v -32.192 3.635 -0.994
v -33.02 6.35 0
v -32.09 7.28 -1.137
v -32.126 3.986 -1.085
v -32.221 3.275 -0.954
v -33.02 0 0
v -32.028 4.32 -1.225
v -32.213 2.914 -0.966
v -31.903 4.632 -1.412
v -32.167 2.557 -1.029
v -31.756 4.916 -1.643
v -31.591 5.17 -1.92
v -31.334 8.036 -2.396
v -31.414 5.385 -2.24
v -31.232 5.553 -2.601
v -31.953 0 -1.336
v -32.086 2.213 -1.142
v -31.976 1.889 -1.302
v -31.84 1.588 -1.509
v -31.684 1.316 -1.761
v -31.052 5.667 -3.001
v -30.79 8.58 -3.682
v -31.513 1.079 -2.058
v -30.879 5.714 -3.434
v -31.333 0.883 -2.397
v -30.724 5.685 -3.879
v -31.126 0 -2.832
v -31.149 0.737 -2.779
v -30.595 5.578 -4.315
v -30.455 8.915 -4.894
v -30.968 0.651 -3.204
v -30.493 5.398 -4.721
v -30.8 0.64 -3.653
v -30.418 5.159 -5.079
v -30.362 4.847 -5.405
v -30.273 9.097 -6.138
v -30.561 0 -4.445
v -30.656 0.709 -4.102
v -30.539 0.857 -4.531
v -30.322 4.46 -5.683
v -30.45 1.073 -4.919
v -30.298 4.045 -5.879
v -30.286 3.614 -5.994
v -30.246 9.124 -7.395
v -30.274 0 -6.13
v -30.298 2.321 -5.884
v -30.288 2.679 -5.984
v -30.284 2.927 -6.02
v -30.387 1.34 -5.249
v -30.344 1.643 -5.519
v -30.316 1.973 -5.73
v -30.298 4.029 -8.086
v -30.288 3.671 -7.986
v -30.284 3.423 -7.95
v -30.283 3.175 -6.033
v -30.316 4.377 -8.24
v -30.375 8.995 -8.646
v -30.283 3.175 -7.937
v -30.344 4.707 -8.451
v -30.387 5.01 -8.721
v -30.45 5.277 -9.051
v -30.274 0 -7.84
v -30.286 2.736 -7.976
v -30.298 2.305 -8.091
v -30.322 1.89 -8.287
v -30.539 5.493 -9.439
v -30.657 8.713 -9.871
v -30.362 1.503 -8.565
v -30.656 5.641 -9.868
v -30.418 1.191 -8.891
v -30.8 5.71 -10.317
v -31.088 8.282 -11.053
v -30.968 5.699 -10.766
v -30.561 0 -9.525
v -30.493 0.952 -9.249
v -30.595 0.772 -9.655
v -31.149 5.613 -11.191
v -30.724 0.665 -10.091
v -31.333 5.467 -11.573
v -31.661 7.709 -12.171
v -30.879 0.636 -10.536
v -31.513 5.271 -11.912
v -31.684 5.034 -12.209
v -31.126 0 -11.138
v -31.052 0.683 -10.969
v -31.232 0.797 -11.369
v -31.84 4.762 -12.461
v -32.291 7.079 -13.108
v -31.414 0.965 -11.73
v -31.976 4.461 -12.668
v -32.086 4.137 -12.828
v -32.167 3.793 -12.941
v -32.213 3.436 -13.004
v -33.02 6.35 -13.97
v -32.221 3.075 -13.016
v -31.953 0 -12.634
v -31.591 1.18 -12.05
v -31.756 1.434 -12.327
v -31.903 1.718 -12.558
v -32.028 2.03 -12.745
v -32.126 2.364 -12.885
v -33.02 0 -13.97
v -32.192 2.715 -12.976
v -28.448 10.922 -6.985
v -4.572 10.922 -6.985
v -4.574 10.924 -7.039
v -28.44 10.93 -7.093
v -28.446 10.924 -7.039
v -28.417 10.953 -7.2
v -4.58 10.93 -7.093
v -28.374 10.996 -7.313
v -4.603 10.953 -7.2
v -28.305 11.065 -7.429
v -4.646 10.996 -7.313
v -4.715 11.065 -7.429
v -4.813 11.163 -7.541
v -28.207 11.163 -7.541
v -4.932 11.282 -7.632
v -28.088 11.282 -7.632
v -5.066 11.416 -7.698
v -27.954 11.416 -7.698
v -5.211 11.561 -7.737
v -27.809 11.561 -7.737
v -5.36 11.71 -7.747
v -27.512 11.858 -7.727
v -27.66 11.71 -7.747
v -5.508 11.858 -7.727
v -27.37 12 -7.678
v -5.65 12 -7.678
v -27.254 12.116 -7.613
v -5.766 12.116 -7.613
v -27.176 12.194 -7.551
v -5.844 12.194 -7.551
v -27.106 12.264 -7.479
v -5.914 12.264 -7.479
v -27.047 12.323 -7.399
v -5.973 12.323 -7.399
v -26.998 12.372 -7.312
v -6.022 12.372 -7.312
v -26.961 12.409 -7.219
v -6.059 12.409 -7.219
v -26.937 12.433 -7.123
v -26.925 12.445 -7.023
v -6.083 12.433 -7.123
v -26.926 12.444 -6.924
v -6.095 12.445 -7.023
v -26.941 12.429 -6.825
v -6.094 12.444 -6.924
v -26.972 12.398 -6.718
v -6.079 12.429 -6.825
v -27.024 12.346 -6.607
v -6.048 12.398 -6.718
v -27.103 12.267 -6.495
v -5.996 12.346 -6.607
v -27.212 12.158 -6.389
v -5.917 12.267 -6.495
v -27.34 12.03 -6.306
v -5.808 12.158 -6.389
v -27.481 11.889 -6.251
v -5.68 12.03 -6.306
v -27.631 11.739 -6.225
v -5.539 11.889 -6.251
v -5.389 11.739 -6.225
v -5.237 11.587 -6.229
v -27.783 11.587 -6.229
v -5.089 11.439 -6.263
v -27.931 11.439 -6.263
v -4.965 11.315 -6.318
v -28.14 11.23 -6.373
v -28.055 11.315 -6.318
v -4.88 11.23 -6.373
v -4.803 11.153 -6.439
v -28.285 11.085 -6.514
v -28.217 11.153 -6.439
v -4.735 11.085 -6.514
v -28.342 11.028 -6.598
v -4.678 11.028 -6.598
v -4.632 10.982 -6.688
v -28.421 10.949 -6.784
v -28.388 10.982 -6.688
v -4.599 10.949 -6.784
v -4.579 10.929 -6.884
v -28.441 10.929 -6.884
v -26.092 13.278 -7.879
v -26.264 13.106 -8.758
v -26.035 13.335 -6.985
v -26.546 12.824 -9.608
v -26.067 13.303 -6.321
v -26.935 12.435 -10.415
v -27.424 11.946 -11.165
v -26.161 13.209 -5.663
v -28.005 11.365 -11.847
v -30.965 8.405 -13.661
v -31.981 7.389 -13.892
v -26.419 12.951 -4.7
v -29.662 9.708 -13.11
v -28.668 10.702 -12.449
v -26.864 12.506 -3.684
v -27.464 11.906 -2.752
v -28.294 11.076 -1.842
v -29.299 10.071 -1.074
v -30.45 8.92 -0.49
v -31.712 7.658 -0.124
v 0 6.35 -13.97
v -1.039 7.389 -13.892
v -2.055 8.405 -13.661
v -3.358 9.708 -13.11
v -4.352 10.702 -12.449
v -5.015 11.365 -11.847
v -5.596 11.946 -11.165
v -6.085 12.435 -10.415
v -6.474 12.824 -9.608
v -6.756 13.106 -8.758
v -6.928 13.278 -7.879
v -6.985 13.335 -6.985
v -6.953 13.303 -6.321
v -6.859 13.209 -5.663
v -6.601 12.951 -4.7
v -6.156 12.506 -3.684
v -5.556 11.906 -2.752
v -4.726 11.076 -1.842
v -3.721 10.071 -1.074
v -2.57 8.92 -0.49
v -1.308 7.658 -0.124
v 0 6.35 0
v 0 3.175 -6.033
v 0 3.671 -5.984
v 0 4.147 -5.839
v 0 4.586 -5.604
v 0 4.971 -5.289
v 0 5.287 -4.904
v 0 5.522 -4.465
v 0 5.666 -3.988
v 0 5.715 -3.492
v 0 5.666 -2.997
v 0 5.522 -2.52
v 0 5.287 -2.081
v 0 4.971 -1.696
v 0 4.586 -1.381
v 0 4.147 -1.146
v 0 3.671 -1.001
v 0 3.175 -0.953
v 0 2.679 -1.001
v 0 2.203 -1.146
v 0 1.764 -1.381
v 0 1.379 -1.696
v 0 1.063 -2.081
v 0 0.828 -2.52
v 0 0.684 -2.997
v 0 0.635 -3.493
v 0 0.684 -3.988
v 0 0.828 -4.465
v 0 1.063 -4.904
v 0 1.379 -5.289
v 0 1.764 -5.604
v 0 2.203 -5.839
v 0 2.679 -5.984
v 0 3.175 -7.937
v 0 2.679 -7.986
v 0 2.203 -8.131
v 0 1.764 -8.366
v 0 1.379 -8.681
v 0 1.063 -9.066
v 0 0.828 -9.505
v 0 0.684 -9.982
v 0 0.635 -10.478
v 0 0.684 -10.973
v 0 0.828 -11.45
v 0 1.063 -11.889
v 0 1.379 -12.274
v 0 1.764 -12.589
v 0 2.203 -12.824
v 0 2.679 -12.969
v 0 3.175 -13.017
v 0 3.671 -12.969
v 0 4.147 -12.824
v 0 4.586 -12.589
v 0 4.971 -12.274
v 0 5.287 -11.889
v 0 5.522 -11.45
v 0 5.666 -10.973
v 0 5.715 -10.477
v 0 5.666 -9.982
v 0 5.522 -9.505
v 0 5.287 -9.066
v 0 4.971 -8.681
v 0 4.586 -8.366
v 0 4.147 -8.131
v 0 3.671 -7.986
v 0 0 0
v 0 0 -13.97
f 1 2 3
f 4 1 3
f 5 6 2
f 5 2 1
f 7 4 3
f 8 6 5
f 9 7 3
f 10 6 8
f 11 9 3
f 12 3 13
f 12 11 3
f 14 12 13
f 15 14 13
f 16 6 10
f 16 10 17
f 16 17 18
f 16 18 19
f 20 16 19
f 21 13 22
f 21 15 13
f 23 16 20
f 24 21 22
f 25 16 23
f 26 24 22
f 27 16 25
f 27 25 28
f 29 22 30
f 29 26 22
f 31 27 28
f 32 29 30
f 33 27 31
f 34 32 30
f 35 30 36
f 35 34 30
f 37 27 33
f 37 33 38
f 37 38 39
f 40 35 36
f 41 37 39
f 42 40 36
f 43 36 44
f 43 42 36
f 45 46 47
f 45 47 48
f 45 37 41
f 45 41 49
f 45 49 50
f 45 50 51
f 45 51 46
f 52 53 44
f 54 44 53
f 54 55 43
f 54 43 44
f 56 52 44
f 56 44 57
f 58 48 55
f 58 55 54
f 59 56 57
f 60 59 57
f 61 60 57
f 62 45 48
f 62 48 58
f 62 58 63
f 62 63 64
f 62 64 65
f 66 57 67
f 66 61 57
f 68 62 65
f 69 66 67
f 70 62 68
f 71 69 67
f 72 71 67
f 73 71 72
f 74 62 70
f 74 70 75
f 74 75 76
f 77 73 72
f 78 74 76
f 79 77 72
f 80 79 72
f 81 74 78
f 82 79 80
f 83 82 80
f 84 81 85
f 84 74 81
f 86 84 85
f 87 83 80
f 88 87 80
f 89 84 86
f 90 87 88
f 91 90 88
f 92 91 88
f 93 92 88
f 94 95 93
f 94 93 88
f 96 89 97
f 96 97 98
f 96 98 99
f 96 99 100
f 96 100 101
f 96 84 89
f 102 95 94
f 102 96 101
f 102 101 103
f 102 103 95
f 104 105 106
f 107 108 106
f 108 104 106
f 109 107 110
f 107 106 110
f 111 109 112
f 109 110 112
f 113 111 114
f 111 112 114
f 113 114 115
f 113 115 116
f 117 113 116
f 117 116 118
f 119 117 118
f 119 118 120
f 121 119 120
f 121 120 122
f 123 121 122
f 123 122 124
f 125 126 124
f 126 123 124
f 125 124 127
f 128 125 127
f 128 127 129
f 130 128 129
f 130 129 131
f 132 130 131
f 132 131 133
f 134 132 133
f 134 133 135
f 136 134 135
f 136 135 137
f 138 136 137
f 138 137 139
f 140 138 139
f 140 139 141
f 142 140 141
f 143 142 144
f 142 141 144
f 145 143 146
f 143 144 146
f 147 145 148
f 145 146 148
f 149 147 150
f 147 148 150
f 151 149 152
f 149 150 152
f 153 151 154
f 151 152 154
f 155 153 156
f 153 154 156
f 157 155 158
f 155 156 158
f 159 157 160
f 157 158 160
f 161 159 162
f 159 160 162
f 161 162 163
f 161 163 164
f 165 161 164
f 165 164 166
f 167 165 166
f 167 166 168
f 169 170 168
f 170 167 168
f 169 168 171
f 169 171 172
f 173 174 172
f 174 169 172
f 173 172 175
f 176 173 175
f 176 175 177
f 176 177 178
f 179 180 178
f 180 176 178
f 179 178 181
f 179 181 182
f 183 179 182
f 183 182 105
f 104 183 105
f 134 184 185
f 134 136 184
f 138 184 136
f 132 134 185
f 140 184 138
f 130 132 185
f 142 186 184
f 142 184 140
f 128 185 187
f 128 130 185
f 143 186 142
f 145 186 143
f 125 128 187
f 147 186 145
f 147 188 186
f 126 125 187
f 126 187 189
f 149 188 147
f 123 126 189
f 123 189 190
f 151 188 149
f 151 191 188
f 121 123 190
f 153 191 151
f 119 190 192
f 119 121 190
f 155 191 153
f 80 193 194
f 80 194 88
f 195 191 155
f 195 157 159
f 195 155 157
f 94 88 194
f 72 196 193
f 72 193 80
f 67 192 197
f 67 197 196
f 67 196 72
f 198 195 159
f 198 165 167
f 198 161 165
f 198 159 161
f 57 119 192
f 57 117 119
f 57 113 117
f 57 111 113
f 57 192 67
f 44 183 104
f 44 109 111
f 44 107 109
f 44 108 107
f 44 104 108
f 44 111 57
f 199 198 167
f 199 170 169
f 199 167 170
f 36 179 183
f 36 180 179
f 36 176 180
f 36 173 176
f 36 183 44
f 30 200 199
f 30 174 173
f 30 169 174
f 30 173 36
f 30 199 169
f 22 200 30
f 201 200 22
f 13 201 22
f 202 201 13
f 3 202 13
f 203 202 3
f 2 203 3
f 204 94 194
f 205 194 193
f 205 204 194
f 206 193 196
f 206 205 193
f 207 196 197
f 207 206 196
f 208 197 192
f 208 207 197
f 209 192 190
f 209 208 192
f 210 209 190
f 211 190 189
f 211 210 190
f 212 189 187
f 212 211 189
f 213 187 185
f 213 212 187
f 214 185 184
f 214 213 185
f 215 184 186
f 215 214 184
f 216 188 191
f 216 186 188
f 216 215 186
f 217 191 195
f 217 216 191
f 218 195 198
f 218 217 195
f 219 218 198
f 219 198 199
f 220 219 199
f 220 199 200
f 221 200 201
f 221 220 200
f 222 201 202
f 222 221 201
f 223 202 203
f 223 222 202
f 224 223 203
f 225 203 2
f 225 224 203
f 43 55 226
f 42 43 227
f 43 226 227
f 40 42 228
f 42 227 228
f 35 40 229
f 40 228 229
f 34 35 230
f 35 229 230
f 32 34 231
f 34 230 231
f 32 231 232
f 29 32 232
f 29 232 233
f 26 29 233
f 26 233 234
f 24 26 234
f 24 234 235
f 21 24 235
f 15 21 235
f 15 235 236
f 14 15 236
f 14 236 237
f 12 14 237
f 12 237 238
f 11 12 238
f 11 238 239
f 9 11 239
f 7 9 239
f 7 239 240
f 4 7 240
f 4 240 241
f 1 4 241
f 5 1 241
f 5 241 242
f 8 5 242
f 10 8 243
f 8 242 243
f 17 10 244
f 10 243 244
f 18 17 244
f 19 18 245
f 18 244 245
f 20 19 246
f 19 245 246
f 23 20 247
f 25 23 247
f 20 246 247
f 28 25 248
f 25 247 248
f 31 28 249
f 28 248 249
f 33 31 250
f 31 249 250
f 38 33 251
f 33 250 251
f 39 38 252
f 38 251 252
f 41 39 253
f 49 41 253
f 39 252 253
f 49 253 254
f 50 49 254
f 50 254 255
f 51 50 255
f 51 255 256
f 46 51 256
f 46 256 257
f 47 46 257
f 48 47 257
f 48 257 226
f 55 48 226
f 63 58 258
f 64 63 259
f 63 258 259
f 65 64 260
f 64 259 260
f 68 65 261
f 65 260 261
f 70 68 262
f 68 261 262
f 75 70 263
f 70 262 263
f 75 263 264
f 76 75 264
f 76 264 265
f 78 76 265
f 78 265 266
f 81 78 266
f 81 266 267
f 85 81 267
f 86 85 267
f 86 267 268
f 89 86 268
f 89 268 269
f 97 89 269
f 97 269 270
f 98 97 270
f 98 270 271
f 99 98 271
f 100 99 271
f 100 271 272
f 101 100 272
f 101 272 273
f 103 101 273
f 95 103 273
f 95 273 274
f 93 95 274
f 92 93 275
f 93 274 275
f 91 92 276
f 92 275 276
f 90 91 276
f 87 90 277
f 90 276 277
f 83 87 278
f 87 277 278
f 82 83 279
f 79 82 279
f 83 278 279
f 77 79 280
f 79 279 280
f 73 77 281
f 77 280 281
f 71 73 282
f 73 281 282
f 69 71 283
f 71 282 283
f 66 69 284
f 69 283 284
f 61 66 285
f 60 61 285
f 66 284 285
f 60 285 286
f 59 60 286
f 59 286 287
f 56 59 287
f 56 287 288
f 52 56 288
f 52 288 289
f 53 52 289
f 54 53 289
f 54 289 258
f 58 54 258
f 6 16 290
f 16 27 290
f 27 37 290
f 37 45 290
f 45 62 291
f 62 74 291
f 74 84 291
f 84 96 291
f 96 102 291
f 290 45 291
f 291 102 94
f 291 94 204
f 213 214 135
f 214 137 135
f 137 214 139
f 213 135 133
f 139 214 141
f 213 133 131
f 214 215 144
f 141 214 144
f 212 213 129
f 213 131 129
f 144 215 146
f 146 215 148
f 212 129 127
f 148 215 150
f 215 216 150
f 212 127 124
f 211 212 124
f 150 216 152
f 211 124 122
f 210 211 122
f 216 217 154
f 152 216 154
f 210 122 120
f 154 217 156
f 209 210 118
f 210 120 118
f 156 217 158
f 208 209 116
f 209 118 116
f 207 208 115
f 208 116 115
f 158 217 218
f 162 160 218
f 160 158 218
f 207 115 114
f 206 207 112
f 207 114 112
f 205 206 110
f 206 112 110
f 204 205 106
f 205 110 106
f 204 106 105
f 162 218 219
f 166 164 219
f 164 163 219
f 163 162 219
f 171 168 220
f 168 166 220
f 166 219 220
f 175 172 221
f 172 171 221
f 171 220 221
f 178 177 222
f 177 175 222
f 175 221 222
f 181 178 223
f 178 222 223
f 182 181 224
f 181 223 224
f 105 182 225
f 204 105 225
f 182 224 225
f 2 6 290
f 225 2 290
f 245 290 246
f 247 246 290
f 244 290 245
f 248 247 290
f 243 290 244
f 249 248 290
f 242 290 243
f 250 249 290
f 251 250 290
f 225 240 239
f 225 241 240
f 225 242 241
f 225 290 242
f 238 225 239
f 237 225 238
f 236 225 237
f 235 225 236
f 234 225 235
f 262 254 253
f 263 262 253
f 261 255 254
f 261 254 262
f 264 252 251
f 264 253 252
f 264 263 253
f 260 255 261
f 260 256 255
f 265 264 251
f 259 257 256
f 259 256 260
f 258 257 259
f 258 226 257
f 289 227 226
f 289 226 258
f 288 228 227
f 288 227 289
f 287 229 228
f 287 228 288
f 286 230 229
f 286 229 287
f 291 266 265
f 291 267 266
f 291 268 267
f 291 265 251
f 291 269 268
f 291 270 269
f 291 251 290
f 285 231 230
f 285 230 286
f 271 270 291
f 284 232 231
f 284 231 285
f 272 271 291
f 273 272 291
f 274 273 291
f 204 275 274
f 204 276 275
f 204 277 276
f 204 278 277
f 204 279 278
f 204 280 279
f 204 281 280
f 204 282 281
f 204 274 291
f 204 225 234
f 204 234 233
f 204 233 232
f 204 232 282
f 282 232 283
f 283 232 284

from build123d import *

# Parameters (mm, degrees)
SKETCH1_W              = 33.02
SKETCH1_H              = 13.97
DEPTH_A_DEPTH          = 6.35
ROUND_EXTRUDE_DEPTH    = 33.02
ANGLE_CUT_DEPTH        = 39.253150524
STRING_HOLE_R          = 0.762
STRING_HOLE_CUT_DEPTH  = 39.253150524
ELASTIC_HOLES_R        = 2.54
ELASTIC_HOLE_CUT_DEPTH = 39.253150524
GUIDE_CUT_REACH        = 40.253


with BuildPart() as part:
    # Sketch1 → depth a (new body)
    with BuildSketch(Plane(origin=(0, 0, 0), x_dir=(1, 0, 0), z_dir=(0, 1, 0))):
        with Locations((-16.51, 6.985)):
            Rectangle(SKETCH1_W, SKETCH1_H)
    extrude(amount=DEPTH_A_DEPTH)

    # Sketch4 → round extrude (add)
    with BuildSketch(Plane(origin=(0, 0, 0), x_dir=(0, 0, -1), z_dir=(1, 0, 0))):
        with BuildLine():
            Line((0, 6.35), (13.97, 6.35))
            ThreePointArc((13.97, 6.35), (6.985, 13.335), (0, 6.35))
        make_face()
    extrude(amount=-ROUND_EXTRUDE_DEPTH)

    # Sketch5 → angle cut (cut, through all)
    with BuildSketch(Plane.XY):
        Polygon((0, 6.35), (0, 13.335), (-6.985, 13.335), align=None)
        Polygon((-33.02, 6.35), (-33.02, 13.335), (-26.035, 13.335), align=None)
    extrude(amount=-ANGLE_CUT_DEPTH, mode=Mode.SUBTRACT)

    # string hole → string hole cut (cut, through all)
    with BuildSketch(Plane(origin=(0, 0, 0), x_dir=(0, 0, -1), z_dir=(1, 0, 0))):
        with Locations(Location((6.985, 11.684, 0), (0, 0, 270))):
            Circle(STRING_HOLE_R)
    extrude(amount=-STRING_HOLE_CUT_DEPTH, mode=Mode.SUBTRACT)

    # elastic holes → elastic hole cut (cut, through all)
    with BuildSketch(Plane(origin=(0, 0, 0), x_dir=(0, 0, -1), z_dir=(1, 0, 0))):
        with Locations((3.4925, 3.175)):
            Circle(ELASTIC_HOLES_R)
        with Locations(Location((10.4775, 3.175, 0), (0, 0, 180))):
            Circle(ELASTIC_HOLES_R)
    extrude(amount=-ELASTIC_HOLE_CUT_DEPTH, mode=Mode.SUBTRACT)

    # guide → guide cut (cut, up to next)
    with BuildSketch(Plane(origin=(0, 0, 0), x_dir=(1, 0, 0), z_dir=(0, 1, 0)), mode=Mode.PRIVATE) as guide_cut_sk1:
        with BuildLine():
            Line((-33.02, 13.97), (-33.02, 0))
            ThreePointArc((-33.02, 0), (-30.238033275, 6.985), (-33.02, 13.97))
        make_face()
    guide_cut_tool1 = extrude(guide_cut_sk1.sketch, amount=GUIDE_CUT_REACH, mode=Mode.PRIVATE) & part.part
    add(guide_cut_tool1.solids().sort_by_distance((-31.893025, 0, -6.985))[0], mode=Mode.SUBTRACT)


solid = part.part
